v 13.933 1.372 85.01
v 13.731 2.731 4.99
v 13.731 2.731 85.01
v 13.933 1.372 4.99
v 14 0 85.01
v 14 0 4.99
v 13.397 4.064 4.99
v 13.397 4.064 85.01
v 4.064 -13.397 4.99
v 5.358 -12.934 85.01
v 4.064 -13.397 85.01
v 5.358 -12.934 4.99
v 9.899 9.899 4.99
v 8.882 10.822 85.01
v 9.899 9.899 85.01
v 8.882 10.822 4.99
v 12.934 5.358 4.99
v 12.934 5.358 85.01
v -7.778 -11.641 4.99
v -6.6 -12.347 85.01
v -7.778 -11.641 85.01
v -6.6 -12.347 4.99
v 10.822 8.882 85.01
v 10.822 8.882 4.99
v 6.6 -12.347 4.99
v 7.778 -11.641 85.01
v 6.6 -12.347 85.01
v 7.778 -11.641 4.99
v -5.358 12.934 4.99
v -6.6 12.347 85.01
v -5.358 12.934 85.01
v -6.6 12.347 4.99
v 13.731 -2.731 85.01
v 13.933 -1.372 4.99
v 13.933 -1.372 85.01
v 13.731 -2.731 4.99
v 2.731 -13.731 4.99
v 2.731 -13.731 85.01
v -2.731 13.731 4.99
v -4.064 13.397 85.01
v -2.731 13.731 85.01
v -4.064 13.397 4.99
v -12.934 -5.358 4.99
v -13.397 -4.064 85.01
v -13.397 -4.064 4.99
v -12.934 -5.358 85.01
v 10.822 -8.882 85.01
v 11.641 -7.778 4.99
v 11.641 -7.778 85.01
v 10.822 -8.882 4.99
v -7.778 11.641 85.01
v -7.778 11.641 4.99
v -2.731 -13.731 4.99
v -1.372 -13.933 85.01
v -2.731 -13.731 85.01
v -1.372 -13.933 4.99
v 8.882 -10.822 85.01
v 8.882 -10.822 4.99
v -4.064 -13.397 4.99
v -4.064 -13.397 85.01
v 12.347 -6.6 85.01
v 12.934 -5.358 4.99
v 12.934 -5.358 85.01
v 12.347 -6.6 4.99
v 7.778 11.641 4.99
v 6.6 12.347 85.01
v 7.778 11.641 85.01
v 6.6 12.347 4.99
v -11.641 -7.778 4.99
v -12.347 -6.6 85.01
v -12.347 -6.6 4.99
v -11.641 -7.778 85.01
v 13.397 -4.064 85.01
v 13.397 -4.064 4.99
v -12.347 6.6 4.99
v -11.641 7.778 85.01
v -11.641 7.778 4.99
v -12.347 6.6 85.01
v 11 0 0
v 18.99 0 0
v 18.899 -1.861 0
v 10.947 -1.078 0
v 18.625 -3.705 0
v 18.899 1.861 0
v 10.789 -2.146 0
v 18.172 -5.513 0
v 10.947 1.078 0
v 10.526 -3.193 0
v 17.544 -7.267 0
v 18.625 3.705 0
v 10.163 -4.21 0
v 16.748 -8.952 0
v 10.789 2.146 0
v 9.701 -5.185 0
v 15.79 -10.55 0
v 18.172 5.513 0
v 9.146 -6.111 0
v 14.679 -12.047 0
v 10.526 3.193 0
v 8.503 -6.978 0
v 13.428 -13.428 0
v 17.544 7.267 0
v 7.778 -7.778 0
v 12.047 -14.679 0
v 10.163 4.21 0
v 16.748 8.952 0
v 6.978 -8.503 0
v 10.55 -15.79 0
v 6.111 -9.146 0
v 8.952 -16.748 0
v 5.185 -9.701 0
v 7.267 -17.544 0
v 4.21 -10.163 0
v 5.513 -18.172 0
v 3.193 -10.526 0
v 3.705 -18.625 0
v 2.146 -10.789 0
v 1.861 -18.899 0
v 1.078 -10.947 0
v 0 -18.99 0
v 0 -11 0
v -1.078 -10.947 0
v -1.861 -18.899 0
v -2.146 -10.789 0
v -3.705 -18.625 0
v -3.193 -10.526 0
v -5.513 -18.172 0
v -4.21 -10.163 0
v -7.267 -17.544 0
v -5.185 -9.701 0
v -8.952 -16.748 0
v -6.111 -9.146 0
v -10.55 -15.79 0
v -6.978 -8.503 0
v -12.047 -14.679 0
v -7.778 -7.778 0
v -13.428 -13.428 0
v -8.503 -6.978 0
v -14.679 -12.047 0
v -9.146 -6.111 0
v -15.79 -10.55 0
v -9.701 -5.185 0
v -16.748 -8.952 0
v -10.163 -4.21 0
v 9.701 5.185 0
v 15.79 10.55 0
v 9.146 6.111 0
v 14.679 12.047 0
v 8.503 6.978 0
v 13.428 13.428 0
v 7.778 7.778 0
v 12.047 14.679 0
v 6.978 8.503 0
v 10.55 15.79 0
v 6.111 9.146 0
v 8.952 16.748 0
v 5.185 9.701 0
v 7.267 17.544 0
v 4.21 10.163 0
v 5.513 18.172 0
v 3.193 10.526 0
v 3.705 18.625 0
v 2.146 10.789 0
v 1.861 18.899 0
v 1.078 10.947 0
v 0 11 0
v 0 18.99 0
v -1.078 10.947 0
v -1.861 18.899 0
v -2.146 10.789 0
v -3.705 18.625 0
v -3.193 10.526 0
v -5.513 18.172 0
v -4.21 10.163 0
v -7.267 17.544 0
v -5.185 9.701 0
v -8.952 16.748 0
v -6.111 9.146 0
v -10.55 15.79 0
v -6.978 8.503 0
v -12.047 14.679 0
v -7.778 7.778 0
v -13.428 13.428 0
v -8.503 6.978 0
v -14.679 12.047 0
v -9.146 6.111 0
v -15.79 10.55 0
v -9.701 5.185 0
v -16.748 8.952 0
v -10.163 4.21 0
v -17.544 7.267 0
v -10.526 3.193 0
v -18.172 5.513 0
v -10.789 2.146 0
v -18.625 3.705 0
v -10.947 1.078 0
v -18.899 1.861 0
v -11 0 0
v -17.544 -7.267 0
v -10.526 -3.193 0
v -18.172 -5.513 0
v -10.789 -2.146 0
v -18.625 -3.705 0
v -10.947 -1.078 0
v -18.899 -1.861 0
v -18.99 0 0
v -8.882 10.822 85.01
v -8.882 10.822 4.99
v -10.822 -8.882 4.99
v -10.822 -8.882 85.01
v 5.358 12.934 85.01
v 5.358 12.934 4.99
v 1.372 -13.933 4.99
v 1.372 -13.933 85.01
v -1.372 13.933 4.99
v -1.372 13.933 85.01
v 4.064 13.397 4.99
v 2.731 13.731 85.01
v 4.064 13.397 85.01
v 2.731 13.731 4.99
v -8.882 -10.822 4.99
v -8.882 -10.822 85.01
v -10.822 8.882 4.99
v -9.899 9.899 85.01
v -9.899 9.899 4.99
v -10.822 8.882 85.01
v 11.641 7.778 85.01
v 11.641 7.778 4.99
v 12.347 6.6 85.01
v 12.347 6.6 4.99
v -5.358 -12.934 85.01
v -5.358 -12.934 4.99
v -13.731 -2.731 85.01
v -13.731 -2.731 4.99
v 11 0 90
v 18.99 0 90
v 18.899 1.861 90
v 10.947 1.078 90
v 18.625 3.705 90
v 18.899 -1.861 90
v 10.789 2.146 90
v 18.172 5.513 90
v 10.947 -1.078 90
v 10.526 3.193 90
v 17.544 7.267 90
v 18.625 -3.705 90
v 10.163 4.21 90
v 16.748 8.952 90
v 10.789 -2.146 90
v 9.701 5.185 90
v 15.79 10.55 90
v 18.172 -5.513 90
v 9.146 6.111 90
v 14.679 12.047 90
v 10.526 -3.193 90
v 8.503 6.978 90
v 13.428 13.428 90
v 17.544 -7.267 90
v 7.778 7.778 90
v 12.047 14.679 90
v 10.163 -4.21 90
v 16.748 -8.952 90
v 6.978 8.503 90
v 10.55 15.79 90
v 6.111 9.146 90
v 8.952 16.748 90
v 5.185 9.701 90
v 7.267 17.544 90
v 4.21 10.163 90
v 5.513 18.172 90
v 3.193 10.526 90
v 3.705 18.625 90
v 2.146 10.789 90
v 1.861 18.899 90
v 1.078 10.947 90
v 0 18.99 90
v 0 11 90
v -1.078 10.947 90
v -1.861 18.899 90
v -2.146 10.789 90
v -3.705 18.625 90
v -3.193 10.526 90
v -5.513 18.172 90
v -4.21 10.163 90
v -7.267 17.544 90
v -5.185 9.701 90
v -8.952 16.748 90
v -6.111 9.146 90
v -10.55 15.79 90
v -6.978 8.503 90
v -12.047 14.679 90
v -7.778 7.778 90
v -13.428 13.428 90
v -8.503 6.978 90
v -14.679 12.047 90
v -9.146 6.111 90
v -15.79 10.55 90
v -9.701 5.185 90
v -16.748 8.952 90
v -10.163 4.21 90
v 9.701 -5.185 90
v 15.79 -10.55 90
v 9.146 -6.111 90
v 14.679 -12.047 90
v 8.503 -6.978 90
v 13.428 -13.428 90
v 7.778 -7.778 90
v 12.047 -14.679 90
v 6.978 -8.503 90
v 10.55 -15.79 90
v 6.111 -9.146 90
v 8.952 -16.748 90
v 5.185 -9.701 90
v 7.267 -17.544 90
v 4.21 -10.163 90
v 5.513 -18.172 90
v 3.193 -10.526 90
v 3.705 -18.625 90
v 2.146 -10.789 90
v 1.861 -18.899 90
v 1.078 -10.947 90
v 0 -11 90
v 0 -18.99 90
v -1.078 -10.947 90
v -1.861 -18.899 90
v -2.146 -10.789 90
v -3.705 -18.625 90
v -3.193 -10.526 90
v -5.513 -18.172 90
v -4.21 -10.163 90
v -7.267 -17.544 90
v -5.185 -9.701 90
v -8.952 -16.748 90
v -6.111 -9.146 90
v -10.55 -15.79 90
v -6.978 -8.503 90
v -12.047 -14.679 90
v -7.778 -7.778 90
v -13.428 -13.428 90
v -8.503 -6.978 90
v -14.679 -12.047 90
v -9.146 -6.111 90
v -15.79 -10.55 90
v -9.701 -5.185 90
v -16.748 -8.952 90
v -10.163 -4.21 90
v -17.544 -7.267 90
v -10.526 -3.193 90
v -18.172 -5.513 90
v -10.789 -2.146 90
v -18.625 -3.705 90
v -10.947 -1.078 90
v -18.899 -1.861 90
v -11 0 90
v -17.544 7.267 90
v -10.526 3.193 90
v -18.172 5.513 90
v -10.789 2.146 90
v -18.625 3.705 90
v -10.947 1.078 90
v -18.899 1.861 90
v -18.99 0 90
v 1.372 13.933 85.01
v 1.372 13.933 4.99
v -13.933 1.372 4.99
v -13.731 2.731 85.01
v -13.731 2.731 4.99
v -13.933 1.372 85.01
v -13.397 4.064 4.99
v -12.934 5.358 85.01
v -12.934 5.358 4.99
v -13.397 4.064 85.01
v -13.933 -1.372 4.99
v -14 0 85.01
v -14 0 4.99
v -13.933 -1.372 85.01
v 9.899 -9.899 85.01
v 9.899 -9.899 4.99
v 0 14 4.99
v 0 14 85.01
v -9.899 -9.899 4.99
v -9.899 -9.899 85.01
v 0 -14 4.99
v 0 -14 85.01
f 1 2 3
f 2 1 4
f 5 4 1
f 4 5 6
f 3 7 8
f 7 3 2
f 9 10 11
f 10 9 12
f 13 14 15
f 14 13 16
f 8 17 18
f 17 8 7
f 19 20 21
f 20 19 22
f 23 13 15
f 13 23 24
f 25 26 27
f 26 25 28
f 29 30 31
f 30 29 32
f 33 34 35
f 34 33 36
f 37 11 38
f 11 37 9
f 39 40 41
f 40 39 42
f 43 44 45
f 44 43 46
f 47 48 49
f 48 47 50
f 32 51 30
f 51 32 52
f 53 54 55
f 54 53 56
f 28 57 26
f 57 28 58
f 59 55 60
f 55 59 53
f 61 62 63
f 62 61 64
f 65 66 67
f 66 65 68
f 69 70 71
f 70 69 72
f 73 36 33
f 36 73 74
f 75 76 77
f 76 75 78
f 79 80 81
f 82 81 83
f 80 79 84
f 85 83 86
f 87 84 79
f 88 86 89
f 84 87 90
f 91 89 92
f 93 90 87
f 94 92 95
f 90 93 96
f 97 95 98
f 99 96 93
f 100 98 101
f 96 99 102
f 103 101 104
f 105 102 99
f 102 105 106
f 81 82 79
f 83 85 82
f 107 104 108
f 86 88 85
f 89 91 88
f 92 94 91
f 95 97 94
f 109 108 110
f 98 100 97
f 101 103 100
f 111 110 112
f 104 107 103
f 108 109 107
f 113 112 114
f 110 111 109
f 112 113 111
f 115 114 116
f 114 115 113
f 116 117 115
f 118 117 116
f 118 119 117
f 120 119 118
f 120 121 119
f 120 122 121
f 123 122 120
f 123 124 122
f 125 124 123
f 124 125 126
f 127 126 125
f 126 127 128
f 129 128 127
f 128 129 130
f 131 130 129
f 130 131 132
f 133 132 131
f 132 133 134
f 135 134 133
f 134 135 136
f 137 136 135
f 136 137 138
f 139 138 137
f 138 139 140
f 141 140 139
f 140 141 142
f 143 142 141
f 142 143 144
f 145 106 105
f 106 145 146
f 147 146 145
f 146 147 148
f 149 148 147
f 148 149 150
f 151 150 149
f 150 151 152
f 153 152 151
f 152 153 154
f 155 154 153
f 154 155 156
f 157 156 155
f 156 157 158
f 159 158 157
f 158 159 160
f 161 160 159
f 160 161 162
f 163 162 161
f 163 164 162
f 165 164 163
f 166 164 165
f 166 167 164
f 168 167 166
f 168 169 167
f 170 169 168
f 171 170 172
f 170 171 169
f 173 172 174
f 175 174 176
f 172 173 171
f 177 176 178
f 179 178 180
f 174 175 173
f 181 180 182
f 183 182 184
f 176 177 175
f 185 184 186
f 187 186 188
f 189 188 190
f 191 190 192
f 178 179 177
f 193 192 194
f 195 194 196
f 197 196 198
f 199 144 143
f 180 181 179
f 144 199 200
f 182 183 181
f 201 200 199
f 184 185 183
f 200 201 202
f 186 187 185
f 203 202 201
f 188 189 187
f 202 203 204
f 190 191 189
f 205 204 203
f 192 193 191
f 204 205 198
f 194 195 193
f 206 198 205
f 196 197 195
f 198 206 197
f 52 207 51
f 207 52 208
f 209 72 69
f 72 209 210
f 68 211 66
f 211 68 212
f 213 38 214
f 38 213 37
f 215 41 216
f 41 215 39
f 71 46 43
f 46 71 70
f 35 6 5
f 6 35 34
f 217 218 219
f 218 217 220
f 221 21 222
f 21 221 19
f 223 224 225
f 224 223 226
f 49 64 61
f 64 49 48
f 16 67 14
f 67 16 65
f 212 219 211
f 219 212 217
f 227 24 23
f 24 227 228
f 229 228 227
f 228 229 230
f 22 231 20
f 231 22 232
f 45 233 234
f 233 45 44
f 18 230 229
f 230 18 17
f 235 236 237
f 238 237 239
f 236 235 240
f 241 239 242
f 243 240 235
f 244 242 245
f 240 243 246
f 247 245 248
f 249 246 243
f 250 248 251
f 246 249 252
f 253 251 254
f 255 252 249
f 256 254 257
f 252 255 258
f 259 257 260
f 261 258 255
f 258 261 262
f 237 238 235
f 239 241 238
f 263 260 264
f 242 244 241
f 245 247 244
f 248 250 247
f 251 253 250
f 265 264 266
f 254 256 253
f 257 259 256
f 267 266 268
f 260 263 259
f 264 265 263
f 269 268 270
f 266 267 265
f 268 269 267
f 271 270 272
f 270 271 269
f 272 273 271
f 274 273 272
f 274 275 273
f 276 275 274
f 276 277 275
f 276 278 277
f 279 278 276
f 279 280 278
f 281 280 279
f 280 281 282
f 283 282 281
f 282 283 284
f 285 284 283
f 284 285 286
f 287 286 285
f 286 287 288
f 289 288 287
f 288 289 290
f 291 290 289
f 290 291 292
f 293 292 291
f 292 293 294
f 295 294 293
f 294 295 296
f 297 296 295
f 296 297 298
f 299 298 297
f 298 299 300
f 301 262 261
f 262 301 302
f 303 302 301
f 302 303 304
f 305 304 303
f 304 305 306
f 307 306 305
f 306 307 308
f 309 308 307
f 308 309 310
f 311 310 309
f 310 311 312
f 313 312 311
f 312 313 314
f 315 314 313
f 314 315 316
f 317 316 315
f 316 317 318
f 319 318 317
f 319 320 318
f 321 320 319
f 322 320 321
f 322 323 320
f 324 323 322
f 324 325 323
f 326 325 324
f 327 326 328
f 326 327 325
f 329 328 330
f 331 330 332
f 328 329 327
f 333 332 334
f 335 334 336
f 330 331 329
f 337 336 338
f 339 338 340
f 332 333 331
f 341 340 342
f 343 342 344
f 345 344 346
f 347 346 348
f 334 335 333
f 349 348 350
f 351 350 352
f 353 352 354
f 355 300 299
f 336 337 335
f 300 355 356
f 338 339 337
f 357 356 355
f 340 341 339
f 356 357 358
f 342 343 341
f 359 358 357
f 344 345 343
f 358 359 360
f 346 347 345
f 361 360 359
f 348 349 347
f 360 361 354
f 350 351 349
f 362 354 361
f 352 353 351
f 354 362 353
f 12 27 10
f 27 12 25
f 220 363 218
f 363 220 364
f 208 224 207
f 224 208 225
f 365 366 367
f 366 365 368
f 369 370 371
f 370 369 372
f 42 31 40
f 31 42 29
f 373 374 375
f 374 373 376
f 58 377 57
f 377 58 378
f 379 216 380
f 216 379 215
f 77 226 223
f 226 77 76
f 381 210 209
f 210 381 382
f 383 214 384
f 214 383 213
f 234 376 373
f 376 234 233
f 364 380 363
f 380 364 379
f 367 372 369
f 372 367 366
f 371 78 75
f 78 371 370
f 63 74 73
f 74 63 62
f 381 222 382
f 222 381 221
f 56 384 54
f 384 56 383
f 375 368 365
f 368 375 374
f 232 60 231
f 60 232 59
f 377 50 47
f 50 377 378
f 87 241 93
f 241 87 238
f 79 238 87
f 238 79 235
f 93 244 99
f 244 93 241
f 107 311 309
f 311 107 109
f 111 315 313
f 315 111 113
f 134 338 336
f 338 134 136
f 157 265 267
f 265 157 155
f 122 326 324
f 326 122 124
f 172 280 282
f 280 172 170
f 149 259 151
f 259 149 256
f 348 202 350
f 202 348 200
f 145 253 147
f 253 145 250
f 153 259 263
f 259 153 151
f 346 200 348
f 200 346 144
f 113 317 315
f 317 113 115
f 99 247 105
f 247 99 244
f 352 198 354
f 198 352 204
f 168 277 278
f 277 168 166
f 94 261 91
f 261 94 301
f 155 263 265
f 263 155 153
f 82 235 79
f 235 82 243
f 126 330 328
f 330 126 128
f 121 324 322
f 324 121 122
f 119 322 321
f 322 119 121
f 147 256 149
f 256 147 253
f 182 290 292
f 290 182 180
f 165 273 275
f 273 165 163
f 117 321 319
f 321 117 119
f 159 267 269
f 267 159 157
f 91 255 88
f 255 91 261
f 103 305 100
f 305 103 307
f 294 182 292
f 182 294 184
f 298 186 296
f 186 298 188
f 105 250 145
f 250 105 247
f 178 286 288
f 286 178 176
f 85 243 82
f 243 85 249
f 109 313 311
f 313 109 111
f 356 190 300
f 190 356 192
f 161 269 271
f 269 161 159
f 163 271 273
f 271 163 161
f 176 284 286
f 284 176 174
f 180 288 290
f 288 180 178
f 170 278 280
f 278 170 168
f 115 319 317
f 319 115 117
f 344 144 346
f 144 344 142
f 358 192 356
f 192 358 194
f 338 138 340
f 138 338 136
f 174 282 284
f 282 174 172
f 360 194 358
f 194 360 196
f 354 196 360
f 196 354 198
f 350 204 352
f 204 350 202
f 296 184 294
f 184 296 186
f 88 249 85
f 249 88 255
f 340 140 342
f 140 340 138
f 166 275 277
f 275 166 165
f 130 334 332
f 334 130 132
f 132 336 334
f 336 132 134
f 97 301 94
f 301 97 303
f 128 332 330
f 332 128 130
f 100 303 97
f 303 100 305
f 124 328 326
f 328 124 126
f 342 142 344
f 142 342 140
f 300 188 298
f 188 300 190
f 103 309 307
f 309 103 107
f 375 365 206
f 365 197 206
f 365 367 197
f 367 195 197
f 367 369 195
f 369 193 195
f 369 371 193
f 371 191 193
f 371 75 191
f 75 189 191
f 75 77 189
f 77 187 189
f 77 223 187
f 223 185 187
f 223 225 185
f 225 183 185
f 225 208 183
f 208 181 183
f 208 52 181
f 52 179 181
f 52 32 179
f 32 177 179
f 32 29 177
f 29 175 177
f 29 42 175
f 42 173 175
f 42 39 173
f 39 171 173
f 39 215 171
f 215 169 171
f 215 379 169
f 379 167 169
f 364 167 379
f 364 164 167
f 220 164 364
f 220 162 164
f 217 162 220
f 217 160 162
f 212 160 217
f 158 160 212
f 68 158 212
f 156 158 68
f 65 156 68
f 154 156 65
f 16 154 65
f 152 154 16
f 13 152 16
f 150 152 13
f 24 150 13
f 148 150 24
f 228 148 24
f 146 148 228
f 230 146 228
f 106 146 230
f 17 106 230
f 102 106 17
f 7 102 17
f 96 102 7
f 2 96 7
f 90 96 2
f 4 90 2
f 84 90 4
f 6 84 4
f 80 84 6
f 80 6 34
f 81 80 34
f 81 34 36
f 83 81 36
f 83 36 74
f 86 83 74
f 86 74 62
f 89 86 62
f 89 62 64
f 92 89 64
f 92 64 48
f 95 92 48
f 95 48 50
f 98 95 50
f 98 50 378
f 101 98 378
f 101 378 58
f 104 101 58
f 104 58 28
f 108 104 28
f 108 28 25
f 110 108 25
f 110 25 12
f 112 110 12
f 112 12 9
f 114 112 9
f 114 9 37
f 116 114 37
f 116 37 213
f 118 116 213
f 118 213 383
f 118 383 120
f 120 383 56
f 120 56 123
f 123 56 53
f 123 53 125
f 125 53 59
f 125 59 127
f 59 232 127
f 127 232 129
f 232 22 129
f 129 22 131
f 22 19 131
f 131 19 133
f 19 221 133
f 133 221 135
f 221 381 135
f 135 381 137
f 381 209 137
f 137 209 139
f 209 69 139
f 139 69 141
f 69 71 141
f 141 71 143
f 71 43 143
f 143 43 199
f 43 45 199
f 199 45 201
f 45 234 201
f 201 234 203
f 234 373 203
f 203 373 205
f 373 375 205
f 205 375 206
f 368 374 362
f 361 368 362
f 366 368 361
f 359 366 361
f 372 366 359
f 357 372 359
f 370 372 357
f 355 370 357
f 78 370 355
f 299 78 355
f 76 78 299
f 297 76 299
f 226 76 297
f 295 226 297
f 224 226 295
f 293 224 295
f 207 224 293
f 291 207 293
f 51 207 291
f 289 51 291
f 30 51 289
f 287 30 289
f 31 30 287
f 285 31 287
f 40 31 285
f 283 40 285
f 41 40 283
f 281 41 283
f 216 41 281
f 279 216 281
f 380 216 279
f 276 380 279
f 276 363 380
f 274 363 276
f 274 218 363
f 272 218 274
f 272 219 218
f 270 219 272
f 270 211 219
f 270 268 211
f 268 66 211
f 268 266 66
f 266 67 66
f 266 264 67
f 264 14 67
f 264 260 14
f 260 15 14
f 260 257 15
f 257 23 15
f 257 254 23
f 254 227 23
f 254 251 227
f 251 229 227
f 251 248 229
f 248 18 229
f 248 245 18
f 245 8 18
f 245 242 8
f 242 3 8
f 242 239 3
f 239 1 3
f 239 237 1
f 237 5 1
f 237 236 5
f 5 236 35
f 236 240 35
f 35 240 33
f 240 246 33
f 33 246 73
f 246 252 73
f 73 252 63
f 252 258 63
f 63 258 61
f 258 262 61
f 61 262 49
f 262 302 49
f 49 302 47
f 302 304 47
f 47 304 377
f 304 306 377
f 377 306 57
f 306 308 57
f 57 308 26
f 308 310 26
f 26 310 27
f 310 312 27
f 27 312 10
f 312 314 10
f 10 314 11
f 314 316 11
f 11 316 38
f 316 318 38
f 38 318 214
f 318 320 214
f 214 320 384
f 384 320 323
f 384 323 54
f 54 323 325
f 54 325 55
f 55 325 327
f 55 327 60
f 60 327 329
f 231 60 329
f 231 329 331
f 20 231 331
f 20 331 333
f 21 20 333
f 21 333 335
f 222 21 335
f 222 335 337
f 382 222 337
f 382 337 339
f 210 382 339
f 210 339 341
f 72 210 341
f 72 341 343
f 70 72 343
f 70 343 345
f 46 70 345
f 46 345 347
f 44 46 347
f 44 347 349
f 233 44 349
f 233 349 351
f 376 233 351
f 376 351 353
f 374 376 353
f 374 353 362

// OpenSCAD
inner_diameter = 22;
thickness = 3;
height = 90;
edge_size = 5;

$fn = 64;

outer_diameter = inner_diameter + thickness * 2;

difference() {
    cylinder(h = height, r = outer_diameter / 2);
    translate([0, 0, -0.01]) {
        cylinder(h = height + 0.02, r = inner_diameter / 2);
    }
}

rotate_extrude() {
    triangle(edge_size - 0.01, outer_diameter / 2);
}

translate([0, 0, height]) {
    mirror([0, 0, 1]) {
        rotate_extrude() {
            triangle(edge_size - 0.01, outer_diameter / 2);
        }
    }
}

module triangle(size, offset) {
    polygon(
        [
            [offset, 0],
            [offset + size, 0],
            [offset, size]
        ]
    );
}
